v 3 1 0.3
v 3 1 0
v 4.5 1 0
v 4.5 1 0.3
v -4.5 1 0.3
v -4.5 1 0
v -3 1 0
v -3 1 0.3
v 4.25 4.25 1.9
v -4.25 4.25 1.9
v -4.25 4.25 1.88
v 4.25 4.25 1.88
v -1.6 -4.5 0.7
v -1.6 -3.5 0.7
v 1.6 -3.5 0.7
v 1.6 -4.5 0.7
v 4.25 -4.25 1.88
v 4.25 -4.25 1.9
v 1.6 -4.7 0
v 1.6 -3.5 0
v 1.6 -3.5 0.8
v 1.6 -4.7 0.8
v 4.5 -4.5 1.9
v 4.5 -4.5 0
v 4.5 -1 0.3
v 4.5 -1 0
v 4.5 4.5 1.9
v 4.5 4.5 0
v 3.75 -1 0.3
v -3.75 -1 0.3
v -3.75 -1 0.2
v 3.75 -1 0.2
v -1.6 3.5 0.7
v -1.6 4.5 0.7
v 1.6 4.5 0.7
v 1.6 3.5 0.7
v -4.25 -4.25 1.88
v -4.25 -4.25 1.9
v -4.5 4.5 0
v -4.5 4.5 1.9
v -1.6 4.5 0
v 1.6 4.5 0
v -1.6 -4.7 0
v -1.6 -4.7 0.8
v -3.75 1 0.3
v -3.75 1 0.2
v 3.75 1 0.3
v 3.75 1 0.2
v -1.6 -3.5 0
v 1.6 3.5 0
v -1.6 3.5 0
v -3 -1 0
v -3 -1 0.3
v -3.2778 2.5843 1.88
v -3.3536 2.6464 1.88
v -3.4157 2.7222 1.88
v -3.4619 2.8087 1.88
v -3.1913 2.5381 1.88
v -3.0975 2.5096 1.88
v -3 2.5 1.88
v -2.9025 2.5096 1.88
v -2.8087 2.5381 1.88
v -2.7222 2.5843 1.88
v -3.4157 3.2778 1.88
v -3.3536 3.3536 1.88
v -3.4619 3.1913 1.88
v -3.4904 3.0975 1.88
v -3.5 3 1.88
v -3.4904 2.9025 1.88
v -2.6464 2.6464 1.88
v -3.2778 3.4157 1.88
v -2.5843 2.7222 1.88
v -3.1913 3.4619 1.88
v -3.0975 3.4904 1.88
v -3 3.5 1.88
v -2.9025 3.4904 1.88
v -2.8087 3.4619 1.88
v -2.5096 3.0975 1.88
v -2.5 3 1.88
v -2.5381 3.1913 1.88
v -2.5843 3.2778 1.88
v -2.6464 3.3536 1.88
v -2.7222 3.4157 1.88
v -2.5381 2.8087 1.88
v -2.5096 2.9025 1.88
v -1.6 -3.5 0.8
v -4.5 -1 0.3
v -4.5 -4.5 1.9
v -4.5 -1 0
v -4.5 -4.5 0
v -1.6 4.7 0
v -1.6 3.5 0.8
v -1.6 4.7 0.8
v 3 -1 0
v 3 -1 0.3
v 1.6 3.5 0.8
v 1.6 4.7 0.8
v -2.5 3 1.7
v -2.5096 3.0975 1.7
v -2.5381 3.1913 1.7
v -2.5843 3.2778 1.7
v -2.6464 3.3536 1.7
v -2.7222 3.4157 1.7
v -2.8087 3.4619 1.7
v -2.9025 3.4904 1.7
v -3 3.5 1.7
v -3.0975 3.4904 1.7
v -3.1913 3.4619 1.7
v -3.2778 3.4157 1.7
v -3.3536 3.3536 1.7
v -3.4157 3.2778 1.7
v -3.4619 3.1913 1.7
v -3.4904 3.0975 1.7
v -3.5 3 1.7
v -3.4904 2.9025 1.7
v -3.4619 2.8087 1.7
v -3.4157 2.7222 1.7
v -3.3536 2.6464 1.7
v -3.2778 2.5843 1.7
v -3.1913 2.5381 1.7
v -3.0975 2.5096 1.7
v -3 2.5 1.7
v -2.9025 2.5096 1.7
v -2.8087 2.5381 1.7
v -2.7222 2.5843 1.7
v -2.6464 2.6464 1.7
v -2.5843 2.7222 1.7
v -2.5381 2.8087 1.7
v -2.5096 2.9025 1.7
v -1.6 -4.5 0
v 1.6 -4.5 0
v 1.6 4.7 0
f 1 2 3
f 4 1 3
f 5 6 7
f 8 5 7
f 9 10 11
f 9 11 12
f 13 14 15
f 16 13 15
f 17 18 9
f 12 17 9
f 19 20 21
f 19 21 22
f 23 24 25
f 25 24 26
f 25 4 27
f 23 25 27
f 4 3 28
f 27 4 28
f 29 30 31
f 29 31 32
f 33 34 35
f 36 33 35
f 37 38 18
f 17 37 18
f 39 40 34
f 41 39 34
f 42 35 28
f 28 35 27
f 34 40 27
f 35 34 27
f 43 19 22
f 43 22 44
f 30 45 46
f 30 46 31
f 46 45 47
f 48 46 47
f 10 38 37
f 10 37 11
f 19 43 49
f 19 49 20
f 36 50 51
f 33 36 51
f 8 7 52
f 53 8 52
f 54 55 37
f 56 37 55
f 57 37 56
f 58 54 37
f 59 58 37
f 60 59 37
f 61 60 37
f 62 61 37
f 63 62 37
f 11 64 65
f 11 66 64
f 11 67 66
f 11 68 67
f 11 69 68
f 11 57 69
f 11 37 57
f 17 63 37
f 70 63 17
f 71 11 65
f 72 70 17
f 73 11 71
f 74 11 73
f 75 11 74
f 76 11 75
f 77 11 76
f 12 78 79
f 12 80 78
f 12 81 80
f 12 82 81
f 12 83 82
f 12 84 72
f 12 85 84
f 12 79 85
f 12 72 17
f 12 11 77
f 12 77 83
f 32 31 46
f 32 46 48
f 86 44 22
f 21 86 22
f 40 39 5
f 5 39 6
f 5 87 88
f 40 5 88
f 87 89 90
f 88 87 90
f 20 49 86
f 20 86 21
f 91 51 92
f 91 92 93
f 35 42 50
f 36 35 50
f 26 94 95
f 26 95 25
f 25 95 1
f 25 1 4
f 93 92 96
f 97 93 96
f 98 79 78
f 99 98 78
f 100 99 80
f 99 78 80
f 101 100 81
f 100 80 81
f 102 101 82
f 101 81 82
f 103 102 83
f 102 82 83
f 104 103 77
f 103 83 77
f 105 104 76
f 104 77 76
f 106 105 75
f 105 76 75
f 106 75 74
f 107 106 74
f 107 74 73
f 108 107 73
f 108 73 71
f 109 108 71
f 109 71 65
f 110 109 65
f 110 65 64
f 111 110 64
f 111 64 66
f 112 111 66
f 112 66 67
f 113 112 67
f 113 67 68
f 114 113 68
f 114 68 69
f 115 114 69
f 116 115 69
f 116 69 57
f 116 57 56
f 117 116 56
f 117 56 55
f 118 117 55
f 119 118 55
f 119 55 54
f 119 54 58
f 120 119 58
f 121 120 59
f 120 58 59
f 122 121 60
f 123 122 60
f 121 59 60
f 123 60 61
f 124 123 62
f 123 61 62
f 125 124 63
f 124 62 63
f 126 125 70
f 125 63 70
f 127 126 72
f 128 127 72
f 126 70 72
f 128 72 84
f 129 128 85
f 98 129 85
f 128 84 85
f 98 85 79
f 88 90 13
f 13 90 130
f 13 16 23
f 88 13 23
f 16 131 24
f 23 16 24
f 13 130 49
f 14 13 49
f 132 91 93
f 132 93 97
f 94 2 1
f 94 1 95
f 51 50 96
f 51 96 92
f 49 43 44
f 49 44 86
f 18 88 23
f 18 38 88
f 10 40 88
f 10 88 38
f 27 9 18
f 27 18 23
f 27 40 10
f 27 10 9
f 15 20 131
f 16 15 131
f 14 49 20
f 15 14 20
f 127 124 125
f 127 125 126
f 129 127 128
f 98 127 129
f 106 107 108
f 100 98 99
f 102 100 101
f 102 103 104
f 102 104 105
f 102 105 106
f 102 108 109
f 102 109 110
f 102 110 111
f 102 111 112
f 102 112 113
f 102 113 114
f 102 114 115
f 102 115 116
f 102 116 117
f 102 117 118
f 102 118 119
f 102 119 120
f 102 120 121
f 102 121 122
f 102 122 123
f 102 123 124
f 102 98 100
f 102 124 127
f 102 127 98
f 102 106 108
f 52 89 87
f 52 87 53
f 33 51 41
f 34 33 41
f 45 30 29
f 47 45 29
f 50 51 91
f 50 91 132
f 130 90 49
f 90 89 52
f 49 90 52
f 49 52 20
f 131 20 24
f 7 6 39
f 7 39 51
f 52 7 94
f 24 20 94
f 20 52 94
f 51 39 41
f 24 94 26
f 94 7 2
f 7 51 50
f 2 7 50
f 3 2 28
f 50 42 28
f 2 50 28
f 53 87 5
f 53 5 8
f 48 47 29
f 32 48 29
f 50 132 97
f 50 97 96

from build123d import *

# Parameters (mm, degrees)
F1_DEPTH  = 1.9
F2_R      = 0.5
F3_DEPTH  = 0.2
F5_DEPTH  = 0.8
F6_W      = 3.2
F6_H      = 1
F7_DEPTH  = 1.2
F8_W      = 1.5
F8_H      = 2
F9_DEPTH  = 0.3
F10_W     = 7.5
F10_H     = 2
F11_DEPTH = 0.1
F12_W     = 8.5
F12_H     = 8.5
F13_DEPTH = 0.02


with BuildPart() as f1:
    # F0 (on Top) → F1 (new body)
    with BuildSketch(Plane.XY):
        Polygon((-1.6, 4.5), (-4.5, 4.5), (-4.5, -4.5), (-1.6, -4.5), (-1.6, -3.5), (1.6, -3.5), (1.6, -4.5), (4.5, -4.5), (4.5, 4.5), (1.6, 4.5), (1.6, 3.5), (-1.6, 3.5), align=None)
    extrude(amount=F1_DEPTH)

    # F2 (on face) → F3 (cut)
    with BuildSketch(Plane.XY.offset(1.9)):
        with Locations((-3, 3)):
            Circle(F2_R)
    extrude(amount=-F3_DEPTH, mode=Mode.SUBTRACT)

    # F6 (on face) → F7 (join)
    with BuildSketch(Plane.XY.offset(1.9)):
        with Locations((0, 4)):
            Rectangle(F6_W, F6_H)
        with Locations((0, -4)):
            Rectangle(F6_W, F6_H)
    extrude(amount=-F7_DEPTH)

    # F8 (on face) → F9 (cut)
    with BuildSketch(Plane(origin=(0, 0, 0), x_dir=(1, 0, 0), z_dir=(0, 0, -1))):
        with Locations((-3.75, 0)):
            Rectangle(F8_W, F8_H)
        with Locations((3.75, 0)):
            Rectangle(F8_W, F8_H)
    extrude(amount=-F9_DEPTH, mode=Mode.SUBTRACT)

    # F12 (on face) → F13 (cut)
    with BuildSketch(Plane.XY.offset(1.9)):
        Rectangle(F12_W, F12_H)
    extrude(amount=-F13_DEPTH, mode=Mode.SUBTRACT)


with BuildPart() as f5:
    # F4 (on face) → F5 (new body)
    with BuildSketch(Plane(origin=(0, 0, 0), x_dir=(1, 0, 0), z_dir=(0, 0, -1))):
        Polygon((-1.6, 4.7), (-1.6, 4.5), (-1.6, 3.5), (1.6, 3.5), (1.6, 4.5), (1.6, 4.7), align=None)
    extrude(amount=-F5_DEPTH)


with BuildPart() as f5b:
    # F4 (on face) → F5, piece 2 (new body)
    with BuildSketch(Plane(origin=(0, 0, 0), x_dir=(1, 0, 0), z_dir=(0, 0, -1))):
        Polygon((1.6, -4.5), (1.6, -3.5), (-1.6, -3.5), (-1.6, -4.5), (-1.6, -4.7), (1.6, -4.7), align=None)
    extrude(amount=-F5_DEPTH)


with BuildPart() as f11:
    # F10 (on face) → F11 (new body)
    with BuildSketch(Plane(origin=(0, 0, 0.3), x_dir=(1, 0, 0), z_dir=(0, 0, -1))):
        Rectangle(F10_W, F10_H)
    extrude(amount=F11_DEPTH)


solid = Compound([f1.part, f5.part, f5b.part, f11.part])
